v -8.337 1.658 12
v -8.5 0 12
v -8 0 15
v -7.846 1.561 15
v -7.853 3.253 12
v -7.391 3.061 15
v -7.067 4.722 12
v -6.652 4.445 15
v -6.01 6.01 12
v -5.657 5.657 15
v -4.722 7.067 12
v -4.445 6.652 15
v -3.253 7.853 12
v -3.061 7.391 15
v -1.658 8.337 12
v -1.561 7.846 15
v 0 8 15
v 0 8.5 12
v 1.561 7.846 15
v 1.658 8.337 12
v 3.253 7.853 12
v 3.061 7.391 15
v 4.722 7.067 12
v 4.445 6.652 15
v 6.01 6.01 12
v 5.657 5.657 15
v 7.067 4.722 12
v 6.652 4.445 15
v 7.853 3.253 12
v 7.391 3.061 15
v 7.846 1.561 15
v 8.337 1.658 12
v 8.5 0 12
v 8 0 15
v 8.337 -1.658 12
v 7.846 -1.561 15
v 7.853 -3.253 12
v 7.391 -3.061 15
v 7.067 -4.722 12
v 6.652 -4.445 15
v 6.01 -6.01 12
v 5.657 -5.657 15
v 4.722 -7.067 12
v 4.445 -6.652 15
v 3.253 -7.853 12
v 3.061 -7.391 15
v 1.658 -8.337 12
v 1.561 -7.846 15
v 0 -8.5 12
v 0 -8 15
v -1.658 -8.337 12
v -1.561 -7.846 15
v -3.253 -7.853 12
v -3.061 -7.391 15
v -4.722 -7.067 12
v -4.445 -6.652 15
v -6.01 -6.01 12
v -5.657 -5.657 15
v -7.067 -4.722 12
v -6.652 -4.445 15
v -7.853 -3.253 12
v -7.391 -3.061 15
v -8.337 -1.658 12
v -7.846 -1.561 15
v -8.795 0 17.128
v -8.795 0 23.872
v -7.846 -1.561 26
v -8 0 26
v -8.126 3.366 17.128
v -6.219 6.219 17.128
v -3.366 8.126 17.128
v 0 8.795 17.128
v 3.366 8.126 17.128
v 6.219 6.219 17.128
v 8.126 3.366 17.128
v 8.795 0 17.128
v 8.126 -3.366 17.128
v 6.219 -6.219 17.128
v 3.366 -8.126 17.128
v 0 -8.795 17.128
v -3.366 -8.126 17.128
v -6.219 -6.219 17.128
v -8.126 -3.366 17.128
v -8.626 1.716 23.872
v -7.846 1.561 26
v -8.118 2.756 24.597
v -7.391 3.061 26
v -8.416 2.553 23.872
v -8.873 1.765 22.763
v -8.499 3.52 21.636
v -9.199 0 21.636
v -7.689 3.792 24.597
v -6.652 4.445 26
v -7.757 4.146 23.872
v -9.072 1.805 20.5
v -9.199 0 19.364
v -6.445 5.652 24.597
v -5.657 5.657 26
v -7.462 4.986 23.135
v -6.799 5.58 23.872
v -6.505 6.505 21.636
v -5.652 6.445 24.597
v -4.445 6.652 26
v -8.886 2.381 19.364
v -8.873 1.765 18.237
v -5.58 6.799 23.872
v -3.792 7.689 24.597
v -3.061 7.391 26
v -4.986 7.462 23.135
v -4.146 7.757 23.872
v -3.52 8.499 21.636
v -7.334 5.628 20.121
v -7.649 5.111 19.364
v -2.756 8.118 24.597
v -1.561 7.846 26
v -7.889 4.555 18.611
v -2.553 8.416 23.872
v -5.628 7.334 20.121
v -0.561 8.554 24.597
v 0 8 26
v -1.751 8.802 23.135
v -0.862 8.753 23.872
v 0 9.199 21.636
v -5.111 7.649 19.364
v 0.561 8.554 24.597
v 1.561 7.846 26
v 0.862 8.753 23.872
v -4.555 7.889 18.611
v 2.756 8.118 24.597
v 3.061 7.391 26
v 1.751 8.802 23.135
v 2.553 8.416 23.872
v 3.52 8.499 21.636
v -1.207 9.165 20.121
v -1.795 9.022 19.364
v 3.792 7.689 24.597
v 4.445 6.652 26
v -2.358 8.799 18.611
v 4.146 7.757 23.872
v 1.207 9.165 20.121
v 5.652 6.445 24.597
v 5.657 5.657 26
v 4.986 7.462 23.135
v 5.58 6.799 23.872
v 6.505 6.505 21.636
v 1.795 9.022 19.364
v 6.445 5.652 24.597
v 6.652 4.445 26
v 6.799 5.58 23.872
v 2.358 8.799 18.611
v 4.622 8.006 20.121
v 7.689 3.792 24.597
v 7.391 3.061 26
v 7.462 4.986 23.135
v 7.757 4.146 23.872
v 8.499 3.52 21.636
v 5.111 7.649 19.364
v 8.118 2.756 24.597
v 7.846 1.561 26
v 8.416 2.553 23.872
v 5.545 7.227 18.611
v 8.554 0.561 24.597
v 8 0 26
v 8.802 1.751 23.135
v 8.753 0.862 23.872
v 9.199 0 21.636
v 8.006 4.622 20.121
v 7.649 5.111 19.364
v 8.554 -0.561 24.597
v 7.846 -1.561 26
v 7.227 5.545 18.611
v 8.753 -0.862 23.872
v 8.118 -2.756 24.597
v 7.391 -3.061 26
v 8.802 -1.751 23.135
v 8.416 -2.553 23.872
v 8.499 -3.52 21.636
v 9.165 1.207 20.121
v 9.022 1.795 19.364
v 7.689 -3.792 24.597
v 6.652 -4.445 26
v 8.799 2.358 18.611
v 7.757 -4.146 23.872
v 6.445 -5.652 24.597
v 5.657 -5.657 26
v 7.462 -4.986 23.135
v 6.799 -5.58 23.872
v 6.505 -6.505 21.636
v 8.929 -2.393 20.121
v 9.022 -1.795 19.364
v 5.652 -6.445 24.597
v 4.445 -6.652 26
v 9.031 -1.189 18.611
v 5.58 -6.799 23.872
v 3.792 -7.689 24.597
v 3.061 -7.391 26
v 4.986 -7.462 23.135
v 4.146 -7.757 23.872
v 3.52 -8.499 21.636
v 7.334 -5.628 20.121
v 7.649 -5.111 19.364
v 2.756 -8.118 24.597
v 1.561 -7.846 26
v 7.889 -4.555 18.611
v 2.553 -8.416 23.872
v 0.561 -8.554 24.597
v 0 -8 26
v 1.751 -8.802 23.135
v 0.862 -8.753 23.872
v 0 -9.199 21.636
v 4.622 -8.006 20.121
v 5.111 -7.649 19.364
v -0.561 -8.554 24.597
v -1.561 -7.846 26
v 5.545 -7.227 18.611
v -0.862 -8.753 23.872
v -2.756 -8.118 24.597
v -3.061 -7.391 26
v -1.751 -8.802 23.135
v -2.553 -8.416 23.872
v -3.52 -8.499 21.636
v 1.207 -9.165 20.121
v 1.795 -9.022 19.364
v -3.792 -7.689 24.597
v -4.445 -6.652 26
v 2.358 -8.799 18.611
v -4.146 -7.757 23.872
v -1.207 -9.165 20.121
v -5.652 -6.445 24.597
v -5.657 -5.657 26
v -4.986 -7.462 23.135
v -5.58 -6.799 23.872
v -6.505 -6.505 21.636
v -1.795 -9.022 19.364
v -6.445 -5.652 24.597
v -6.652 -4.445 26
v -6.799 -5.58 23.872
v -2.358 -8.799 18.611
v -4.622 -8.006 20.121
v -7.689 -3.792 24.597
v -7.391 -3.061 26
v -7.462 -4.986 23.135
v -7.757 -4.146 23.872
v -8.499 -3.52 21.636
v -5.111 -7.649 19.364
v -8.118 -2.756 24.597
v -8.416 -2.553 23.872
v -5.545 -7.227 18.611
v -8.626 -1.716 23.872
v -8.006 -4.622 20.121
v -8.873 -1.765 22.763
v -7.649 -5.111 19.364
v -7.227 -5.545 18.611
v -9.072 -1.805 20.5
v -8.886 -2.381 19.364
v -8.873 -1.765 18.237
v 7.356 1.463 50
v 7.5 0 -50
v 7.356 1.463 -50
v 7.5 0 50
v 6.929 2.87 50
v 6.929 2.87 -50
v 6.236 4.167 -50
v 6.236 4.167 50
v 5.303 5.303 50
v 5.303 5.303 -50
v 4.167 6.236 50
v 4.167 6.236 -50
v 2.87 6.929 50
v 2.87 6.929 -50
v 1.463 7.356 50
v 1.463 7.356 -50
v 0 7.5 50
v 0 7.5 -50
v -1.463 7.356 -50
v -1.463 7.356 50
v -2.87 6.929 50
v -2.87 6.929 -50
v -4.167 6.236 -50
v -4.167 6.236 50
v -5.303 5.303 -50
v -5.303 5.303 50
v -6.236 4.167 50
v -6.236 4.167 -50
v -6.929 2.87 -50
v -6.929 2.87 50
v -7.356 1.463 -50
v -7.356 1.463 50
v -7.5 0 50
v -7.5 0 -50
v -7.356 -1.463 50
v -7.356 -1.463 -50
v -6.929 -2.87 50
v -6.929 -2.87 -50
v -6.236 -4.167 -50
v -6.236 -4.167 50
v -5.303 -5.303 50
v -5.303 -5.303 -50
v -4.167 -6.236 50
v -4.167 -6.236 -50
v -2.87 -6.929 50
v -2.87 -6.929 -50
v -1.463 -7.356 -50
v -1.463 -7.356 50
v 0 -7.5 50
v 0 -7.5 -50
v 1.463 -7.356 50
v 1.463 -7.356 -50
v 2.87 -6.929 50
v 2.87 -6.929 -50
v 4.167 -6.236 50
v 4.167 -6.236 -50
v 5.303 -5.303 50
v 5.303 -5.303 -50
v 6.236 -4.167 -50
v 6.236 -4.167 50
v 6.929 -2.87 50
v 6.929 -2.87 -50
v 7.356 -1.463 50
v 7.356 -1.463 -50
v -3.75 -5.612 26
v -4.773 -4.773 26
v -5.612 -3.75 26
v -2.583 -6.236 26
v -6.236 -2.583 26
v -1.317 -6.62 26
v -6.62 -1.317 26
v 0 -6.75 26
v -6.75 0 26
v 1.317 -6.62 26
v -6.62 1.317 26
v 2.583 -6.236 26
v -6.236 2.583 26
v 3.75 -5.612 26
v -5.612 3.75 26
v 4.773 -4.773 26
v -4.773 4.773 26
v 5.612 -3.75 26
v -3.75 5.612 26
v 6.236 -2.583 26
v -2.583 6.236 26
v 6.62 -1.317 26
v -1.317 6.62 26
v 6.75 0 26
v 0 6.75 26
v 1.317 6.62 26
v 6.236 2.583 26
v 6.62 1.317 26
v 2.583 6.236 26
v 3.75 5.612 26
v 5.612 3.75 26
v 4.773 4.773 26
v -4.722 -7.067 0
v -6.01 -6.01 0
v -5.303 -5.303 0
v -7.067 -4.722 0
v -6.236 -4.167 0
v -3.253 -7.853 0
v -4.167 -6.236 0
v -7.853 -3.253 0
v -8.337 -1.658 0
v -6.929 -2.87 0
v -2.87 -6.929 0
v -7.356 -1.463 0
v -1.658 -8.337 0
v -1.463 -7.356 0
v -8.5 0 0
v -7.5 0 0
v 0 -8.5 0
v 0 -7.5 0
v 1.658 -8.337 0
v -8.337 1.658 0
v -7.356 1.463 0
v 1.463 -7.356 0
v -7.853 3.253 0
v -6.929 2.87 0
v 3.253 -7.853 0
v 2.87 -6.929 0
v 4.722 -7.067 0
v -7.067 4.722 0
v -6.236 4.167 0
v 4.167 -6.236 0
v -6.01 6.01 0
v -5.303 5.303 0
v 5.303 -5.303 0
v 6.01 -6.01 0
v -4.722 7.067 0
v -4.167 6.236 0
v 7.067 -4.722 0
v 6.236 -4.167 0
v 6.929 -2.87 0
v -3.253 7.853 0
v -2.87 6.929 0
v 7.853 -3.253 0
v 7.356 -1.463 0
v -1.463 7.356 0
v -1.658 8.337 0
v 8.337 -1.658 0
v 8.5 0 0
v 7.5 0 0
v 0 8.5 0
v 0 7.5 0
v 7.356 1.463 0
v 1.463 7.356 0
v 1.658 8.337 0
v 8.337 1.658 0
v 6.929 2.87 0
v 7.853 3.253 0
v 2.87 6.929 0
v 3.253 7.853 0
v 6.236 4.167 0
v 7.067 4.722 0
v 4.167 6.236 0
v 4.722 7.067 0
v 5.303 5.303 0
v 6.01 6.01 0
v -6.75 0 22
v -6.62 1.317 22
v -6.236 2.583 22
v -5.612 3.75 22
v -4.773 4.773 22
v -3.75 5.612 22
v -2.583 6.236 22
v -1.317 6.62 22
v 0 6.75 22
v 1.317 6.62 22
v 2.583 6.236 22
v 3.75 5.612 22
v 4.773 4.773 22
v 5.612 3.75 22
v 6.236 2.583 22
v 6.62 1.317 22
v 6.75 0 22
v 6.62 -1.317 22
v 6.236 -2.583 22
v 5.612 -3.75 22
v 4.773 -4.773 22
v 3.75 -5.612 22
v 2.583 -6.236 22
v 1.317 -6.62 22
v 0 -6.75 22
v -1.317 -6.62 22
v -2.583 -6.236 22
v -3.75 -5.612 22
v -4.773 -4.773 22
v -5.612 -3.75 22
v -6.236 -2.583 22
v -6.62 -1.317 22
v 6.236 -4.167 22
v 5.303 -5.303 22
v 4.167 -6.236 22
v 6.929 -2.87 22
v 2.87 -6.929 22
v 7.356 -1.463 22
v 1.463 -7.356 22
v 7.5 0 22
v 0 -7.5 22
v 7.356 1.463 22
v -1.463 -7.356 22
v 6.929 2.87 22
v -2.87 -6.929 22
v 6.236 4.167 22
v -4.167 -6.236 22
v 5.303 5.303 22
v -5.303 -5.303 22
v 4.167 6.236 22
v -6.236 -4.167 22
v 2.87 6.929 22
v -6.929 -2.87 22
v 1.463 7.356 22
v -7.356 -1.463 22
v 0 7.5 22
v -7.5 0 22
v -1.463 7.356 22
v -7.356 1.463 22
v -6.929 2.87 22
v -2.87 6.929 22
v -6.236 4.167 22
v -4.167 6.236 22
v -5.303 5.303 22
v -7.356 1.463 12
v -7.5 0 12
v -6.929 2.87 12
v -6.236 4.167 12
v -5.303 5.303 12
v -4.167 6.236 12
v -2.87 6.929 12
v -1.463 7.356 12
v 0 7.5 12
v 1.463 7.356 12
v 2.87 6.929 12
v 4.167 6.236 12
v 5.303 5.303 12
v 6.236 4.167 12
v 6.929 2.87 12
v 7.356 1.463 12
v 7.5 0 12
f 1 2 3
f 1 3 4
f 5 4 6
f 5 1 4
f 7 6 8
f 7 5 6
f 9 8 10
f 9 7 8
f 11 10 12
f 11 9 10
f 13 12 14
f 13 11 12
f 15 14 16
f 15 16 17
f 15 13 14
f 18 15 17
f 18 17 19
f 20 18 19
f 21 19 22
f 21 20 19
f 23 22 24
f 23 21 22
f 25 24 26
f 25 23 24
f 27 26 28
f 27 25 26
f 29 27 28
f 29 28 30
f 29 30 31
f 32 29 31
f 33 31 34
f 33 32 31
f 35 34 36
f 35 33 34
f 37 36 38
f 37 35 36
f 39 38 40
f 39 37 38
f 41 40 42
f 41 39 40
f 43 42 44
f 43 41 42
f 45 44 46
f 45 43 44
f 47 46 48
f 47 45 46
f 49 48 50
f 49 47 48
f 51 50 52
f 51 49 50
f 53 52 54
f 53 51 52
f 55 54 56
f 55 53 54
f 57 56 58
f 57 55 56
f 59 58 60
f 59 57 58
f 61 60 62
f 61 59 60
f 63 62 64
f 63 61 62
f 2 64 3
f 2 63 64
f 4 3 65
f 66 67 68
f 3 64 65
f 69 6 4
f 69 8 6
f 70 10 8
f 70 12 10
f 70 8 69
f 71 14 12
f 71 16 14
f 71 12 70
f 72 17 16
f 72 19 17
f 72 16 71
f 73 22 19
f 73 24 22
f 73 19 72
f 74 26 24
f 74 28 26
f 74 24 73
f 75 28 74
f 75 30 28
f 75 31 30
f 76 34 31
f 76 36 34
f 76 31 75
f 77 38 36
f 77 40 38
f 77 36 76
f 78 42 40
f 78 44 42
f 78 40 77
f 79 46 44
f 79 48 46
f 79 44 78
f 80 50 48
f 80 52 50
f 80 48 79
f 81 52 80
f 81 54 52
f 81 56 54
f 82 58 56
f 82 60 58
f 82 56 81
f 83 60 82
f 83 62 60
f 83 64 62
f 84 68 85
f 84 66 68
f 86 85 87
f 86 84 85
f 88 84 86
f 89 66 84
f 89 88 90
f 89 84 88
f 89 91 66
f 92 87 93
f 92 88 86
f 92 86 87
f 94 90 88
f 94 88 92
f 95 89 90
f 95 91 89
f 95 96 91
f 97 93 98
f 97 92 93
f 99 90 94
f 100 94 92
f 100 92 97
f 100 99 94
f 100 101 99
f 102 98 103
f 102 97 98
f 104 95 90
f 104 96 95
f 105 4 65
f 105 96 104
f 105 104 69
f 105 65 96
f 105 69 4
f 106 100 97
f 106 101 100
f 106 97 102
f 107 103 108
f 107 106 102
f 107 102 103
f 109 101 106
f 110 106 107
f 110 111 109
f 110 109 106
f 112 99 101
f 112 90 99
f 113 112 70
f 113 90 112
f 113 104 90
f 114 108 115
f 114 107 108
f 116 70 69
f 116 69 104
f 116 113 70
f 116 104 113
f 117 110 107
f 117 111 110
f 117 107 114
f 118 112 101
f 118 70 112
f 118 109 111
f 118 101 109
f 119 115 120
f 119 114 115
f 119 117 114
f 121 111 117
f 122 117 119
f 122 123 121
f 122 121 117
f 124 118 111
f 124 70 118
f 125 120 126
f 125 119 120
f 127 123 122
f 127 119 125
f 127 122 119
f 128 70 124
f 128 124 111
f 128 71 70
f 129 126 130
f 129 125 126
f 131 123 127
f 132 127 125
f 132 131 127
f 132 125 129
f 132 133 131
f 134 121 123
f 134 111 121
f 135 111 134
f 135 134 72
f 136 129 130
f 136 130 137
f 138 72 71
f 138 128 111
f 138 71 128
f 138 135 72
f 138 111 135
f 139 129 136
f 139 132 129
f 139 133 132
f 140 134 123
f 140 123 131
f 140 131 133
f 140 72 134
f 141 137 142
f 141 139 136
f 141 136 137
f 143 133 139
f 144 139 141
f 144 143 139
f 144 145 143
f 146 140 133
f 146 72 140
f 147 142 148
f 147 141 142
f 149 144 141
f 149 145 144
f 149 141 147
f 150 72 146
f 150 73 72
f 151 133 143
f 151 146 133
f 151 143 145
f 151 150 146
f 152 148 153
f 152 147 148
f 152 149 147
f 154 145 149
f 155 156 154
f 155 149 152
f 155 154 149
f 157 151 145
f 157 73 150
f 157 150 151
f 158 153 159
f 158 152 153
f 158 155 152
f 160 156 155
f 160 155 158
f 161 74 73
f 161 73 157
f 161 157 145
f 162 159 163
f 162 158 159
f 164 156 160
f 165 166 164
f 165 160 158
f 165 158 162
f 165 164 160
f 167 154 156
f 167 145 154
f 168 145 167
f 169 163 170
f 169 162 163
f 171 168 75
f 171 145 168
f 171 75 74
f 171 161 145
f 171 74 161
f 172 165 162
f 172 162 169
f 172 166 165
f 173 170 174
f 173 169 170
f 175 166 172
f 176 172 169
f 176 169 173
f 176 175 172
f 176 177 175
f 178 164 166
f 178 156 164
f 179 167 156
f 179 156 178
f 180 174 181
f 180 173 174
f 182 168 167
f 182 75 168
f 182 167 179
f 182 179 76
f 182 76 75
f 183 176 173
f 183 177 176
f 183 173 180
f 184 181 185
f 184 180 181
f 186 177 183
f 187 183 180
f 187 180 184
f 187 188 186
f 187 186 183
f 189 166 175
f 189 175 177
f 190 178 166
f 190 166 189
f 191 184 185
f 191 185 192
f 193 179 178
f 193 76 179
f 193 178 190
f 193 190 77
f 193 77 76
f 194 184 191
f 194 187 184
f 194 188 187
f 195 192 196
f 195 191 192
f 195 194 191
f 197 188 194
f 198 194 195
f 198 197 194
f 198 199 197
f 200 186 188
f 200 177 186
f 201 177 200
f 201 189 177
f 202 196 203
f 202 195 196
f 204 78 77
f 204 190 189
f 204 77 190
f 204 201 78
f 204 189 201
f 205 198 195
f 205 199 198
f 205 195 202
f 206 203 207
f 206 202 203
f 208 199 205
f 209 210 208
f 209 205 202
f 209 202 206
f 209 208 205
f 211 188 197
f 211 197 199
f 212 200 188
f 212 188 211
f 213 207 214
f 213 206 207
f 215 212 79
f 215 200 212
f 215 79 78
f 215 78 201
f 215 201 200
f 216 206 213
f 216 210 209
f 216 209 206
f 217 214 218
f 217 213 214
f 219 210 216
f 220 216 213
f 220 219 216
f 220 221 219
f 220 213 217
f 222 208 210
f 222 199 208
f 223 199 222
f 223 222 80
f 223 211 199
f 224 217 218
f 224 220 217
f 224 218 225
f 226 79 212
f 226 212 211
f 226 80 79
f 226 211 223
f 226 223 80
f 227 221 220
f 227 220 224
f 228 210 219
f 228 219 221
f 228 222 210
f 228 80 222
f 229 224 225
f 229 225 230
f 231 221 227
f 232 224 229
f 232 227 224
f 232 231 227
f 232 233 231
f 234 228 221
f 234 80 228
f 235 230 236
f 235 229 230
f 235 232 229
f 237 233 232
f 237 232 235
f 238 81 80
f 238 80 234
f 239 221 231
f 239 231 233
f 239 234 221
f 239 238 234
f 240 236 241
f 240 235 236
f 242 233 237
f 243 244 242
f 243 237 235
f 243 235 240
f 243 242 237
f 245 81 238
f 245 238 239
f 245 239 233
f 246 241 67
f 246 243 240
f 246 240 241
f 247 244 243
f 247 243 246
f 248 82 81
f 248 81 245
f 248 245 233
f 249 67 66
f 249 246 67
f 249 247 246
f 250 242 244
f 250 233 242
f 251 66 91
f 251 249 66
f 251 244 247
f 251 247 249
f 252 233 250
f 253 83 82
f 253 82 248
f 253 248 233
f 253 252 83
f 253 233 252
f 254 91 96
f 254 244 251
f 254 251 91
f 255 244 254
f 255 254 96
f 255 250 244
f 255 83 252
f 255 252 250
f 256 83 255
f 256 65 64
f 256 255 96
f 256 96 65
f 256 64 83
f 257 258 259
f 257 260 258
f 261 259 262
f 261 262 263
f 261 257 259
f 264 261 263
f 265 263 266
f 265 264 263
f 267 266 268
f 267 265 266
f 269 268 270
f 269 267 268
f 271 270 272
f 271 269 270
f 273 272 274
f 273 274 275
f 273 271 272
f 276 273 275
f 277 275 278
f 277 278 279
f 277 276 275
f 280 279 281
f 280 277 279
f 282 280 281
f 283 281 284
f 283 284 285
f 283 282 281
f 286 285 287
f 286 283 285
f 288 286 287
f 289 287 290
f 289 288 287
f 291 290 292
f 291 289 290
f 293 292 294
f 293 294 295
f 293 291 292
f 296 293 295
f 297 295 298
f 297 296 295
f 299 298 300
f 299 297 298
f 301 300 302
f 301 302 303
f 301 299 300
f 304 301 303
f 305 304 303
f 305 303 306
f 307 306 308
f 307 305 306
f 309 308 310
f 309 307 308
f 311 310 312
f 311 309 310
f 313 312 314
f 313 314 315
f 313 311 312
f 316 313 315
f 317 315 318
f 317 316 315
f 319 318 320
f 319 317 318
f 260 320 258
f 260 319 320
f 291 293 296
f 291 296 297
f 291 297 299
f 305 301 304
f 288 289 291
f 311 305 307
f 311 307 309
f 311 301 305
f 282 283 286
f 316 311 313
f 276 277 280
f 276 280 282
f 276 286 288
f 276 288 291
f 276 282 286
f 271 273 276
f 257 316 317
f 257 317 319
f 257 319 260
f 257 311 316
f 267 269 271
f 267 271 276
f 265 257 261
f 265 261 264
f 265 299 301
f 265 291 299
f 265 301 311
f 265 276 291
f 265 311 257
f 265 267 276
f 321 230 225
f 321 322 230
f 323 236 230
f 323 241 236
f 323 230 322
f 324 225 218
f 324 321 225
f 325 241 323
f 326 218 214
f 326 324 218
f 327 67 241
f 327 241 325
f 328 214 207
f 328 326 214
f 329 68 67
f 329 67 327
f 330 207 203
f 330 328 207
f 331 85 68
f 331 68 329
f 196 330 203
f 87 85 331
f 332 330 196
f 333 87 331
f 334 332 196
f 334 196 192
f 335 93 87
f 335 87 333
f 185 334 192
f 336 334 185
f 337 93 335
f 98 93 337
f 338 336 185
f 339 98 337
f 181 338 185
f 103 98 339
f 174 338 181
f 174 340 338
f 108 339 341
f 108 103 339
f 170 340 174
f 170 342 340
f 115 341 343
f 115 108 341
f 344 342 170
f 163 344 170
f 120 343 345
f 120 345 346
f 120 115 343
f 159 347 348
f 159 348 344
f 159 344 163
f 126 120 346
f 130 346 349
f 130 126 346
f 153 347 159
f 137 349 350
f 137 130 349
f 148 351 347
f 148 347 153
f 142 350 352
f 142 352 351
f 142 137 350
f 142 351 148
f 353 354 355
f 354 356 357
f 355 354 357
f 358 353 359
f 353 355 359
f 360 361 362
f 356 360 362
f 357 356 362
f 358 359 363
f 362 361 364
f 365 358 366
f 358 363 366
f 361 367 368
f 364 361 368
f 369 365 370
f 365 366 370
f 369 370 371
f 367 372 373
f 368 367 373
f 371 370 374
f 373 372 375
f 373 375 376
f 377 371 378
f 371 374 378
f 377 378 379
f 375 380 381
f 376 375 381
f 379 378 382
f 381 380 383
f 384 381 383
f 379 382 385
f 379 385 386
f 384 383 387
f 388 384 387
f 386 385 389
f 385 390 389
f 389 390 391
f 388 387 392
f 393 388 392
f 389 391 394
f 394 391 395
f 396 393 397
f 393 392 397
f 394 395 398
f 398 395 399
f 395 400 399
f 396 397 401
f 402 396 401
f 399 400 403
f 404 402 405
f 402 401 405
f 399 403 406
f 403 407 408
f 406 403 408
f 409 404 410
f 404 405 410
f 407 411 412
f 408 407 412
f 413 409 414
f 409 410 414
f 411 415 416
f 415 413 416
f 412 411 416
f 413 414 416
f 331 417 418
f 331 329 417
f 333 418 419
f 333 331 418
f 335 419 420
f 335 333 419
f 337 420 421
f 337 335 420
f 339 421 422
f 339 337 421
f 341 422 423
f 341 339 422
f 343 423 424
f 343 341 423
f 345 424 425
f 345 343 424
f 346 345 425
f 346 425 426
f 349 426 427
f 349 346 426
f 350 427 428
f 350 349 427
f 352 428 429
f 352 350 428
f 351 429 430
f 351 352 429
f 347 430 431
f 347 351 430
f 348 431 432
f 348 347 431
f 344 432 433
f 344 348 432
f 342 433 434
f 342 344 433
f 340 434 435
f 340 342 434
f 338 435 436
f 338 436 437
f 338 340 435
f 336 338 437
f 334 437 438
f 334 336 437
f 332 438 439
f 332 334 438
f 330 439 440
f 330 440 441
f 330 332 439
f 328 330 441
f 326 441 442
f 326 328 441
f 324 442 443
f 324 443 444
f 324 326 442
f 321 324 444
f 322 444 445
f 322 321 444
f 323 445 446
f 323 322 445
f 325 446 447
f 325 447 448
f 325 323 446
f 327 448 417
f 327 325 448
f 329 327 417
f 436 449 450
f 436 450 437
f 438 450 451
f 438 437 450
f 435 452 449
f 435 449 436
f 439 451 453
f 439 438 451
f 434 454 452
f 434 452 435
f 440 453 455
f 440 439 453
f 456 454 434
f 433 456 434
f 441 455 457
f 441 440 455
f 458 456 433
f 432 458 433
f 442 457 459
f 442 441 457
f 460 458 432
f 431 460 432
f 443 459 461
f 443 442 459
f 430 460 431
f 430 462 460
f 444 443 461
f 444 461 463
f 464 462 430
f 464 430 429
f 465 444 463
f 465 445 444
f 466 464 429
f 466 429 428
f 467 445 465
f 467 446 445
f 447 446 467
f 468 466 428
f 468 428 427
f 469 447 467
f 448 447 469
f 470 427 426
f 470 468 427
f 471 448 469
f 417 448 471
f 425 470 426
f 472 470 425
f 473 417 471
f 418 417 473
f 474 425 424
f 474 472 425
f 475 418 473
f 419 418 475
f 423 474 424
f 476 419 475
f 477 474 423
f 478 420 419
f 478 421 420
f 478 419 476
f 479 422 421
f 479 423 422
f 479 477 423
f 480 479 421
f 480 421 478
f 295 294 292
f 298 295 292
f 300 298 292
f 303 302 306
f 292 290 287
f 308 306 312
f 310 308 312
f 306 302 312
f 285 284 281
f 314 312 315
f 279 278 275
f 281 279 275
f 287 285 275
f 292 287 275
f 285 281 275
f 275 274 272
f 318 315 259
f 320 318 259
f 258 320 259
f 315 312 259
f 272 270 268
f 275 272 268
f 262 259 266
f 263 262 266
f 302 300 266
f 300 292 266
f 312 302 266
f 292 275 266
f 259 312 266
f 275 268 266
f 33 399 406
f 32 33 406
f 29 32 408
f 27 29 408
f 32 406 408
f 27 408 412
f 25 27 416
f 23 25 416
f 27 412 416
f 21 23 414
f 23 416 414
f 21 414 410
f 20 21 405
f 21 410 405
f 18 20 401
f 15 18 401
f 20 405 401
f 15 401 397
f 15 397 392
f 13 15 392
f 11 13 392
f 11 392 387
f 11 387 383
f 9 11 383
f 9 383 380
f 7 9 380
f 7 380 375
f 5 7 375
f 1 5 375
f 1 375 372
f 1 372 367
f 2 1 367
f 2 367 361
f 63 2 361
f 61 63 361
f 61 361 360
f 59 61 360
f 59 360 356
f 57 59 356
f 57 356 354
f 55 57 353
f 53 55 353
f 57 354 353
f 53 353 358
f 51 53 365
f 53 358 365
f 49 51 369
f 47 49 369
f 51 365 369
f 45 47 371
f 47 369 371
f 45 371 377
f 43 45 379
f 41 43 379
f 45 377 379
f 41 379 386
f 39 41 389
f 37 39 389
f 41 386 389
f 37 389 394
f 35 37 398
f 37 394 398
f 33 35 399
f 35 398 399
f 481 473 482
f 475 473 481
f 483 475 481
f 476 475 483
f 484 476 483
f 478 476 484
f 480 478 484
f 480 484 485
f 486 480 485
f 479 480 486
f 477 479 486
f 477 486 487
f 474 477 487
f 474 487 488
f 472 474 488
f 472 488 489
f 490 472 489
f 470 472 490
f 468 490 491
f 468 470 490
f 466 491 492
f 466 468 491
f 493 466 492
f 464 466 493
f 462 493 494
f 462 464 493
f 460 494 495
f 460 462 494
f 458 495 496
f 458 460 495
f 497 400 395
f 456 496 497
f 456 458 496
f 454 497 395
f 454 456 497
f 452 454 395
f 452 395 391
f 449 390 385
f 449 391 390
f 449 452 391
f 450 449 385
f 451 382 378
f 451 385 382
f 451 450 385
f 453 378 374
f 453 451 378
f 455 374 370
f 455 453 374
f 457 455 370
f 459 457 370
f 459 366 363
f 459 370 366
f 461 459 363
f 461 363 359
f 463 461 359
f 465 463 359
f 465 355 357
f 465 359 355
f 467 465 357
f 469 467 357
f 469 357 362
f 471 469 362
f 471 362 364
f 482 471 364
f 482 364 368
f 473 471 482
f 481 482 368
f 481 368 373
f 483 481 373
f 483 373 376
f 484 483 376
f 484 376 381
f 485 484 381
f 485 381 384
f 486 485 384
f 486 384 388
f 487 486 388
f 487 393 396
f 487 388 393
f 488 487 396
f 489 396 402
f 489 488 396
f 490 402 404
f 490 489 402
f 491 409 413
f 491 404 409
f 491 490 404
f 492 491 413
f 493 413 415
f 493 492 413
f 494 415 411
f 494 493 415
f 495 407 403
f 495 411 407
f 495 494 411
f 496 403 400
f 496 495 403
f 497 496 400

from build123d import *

# Parameters (mm, degrees)
F0_R          = 7.5
F1_DEPTH      = 50
F1_DEPTH_BACK = 50
F2_R          = 8.5
F2_R_2        = 7.5
F3_DEPTH      = 12


with BuildPart() as f1:
    # F0 (on Top) → F1 (new body, two sides)
    with BuildSketch(Plane.XY) as f1_sk:
        Circle(F0_R)
    extrude(amount=F1_DEPTH)
    extrude(f1_sk.sketch, amount=-F1_DEPTH_BACK)


with BuildPart() as f3:
    # F2 (on Top) → F3 (new body)
    with BuildSketch(Plane.XY):
        Circle(F2_R)
        Circle(F2_R_2, mode=Mode.SUBTRACT)
    extrude(amount=F3_DEPTH)

    # F4 (on Front) → F5 (revolve)
    with BuildSketch(Plane.XZ):
        with BuildLine():
            Line((-8, 15), (-7.5, 15))
            Line((-7.5, 15), (-7.5, 22))
            Line((-7.5, 22), (-6.75, 22))
            Line((-6.75, 22), (-6.75, 26))
            Line((-6.75, 26), (-7.5, 26))
            Line((-7.5, 26), (-8, 26))
            ThreePointArc((-8, 26), (-9.25, 20.5), (-8, 15))
        make_face()
        Polygon((-7.5, 12), (-7.5, 15), (-8, 15), (-8.5, 12), align=None)
    revolve(axis=Axis((0, 0, 32.3733808473), (0, 0, -1)))


solid = Compound([f1.part, f3.part])
